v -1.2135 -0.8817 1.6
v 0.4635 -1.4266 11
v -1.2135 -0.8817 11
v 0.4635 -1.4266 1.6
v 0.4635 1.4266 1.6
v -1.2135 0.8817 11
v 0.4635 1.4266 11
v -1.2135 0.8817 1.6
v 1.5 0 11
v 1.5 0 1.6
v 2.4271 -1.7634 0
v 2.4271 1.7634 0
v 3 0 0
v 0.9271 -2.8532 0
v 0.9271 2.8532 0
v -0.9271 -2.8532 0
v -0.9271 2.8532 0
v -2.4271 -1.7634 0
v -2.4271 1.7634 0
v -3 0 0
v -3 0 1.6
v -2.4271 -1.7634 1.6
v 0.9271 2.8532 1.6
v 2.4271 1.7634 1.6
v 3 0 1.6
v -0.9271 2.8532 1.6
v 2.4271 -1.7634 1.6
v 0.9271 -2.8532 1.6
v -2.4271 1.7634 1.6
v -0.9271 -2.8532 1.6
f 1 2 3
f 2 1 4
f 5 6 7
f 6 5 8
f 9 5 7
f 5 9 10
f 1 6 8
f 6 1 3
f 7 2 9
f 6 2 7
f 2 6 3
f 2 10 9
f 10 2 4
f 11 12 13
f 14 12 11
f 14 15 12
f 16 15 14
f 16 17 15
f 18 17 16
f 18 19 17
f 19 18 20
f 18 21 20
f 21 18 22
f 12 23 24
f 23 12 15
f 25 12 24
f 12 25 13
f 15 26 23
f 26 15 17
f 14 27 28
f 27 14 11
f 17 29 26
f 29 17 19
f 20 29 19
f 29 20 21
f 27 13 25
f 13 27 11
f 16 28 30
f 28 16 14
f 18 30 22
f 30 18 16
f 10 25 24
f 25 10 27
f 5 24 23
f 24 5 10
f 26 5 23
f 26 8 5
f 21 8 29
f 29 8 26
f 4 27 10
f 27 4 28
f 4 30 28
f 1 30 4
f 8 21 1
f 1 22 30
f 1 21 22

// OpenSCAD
// part_id: a8
// name: A8 rivet pin
// source_drawing_ids: DRW-001
// units: mm
// revision: 0.1-placeholder
// SPDX-License-Identifier: MIT

module part_a8(pin_d = 3, pin_h = 11, head_d = 6, head_h = 1.6) {
    union() {
        cylinder(d = pin_d, h = pin_h, center = false);
        cylinder(d = head_d, h = head_h, center = false);
    }
}


// ---- "main guard" ----
// Default to previewing when opened directly:
if (is_undef(__LIB_MODE__)) {
    part_a8();
}
